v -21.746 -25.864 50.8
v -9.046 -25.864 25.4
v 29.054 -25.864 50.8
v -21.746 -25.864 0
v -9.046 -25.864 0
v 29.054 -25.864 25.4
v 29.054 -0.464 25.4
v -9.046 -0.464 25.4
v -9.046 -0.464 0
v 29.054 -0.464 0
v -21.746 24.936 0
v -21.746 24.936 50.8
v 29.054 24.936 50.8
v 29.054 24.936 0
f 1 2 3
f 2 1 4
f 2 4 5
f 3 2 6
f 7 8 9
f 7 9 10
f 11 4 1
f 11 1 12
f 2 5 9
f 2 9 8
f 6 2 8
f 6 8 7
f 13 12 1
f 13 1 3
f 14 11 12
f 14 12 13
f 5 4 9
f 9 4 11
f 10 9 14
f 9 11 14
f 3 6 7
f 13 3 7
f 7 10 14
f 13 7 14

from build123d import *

# Parameters (mm, degrees)
F0_W     = 50.8
F0_H     = 50.8
F1_DEPTH = 50.8
F2_W     = 38.1
F2_H     = 25.4
F3_DEPTH = 25.4


with BuildPart() as f1:
    # F0 (on Top) → F1 (new body)
    with BuildSketch(Plane.XY):
        with Locations((3.653681, -0.464274)):
            Rectangle(F0_W, F0_H)
    extrude(amount=F1_DEPTH)

    # F2 (on face) → F3 (cut)
    with BuildSketch(Plane.XZ.offset(25.864274)):
        with Locations((10.003681, 12.7)):
            Rectangle(F2_W, F2_H)
    extrude(amount=-F3_DEPTH, mode=Mode.SUBTRACT)


solid = f1.part
